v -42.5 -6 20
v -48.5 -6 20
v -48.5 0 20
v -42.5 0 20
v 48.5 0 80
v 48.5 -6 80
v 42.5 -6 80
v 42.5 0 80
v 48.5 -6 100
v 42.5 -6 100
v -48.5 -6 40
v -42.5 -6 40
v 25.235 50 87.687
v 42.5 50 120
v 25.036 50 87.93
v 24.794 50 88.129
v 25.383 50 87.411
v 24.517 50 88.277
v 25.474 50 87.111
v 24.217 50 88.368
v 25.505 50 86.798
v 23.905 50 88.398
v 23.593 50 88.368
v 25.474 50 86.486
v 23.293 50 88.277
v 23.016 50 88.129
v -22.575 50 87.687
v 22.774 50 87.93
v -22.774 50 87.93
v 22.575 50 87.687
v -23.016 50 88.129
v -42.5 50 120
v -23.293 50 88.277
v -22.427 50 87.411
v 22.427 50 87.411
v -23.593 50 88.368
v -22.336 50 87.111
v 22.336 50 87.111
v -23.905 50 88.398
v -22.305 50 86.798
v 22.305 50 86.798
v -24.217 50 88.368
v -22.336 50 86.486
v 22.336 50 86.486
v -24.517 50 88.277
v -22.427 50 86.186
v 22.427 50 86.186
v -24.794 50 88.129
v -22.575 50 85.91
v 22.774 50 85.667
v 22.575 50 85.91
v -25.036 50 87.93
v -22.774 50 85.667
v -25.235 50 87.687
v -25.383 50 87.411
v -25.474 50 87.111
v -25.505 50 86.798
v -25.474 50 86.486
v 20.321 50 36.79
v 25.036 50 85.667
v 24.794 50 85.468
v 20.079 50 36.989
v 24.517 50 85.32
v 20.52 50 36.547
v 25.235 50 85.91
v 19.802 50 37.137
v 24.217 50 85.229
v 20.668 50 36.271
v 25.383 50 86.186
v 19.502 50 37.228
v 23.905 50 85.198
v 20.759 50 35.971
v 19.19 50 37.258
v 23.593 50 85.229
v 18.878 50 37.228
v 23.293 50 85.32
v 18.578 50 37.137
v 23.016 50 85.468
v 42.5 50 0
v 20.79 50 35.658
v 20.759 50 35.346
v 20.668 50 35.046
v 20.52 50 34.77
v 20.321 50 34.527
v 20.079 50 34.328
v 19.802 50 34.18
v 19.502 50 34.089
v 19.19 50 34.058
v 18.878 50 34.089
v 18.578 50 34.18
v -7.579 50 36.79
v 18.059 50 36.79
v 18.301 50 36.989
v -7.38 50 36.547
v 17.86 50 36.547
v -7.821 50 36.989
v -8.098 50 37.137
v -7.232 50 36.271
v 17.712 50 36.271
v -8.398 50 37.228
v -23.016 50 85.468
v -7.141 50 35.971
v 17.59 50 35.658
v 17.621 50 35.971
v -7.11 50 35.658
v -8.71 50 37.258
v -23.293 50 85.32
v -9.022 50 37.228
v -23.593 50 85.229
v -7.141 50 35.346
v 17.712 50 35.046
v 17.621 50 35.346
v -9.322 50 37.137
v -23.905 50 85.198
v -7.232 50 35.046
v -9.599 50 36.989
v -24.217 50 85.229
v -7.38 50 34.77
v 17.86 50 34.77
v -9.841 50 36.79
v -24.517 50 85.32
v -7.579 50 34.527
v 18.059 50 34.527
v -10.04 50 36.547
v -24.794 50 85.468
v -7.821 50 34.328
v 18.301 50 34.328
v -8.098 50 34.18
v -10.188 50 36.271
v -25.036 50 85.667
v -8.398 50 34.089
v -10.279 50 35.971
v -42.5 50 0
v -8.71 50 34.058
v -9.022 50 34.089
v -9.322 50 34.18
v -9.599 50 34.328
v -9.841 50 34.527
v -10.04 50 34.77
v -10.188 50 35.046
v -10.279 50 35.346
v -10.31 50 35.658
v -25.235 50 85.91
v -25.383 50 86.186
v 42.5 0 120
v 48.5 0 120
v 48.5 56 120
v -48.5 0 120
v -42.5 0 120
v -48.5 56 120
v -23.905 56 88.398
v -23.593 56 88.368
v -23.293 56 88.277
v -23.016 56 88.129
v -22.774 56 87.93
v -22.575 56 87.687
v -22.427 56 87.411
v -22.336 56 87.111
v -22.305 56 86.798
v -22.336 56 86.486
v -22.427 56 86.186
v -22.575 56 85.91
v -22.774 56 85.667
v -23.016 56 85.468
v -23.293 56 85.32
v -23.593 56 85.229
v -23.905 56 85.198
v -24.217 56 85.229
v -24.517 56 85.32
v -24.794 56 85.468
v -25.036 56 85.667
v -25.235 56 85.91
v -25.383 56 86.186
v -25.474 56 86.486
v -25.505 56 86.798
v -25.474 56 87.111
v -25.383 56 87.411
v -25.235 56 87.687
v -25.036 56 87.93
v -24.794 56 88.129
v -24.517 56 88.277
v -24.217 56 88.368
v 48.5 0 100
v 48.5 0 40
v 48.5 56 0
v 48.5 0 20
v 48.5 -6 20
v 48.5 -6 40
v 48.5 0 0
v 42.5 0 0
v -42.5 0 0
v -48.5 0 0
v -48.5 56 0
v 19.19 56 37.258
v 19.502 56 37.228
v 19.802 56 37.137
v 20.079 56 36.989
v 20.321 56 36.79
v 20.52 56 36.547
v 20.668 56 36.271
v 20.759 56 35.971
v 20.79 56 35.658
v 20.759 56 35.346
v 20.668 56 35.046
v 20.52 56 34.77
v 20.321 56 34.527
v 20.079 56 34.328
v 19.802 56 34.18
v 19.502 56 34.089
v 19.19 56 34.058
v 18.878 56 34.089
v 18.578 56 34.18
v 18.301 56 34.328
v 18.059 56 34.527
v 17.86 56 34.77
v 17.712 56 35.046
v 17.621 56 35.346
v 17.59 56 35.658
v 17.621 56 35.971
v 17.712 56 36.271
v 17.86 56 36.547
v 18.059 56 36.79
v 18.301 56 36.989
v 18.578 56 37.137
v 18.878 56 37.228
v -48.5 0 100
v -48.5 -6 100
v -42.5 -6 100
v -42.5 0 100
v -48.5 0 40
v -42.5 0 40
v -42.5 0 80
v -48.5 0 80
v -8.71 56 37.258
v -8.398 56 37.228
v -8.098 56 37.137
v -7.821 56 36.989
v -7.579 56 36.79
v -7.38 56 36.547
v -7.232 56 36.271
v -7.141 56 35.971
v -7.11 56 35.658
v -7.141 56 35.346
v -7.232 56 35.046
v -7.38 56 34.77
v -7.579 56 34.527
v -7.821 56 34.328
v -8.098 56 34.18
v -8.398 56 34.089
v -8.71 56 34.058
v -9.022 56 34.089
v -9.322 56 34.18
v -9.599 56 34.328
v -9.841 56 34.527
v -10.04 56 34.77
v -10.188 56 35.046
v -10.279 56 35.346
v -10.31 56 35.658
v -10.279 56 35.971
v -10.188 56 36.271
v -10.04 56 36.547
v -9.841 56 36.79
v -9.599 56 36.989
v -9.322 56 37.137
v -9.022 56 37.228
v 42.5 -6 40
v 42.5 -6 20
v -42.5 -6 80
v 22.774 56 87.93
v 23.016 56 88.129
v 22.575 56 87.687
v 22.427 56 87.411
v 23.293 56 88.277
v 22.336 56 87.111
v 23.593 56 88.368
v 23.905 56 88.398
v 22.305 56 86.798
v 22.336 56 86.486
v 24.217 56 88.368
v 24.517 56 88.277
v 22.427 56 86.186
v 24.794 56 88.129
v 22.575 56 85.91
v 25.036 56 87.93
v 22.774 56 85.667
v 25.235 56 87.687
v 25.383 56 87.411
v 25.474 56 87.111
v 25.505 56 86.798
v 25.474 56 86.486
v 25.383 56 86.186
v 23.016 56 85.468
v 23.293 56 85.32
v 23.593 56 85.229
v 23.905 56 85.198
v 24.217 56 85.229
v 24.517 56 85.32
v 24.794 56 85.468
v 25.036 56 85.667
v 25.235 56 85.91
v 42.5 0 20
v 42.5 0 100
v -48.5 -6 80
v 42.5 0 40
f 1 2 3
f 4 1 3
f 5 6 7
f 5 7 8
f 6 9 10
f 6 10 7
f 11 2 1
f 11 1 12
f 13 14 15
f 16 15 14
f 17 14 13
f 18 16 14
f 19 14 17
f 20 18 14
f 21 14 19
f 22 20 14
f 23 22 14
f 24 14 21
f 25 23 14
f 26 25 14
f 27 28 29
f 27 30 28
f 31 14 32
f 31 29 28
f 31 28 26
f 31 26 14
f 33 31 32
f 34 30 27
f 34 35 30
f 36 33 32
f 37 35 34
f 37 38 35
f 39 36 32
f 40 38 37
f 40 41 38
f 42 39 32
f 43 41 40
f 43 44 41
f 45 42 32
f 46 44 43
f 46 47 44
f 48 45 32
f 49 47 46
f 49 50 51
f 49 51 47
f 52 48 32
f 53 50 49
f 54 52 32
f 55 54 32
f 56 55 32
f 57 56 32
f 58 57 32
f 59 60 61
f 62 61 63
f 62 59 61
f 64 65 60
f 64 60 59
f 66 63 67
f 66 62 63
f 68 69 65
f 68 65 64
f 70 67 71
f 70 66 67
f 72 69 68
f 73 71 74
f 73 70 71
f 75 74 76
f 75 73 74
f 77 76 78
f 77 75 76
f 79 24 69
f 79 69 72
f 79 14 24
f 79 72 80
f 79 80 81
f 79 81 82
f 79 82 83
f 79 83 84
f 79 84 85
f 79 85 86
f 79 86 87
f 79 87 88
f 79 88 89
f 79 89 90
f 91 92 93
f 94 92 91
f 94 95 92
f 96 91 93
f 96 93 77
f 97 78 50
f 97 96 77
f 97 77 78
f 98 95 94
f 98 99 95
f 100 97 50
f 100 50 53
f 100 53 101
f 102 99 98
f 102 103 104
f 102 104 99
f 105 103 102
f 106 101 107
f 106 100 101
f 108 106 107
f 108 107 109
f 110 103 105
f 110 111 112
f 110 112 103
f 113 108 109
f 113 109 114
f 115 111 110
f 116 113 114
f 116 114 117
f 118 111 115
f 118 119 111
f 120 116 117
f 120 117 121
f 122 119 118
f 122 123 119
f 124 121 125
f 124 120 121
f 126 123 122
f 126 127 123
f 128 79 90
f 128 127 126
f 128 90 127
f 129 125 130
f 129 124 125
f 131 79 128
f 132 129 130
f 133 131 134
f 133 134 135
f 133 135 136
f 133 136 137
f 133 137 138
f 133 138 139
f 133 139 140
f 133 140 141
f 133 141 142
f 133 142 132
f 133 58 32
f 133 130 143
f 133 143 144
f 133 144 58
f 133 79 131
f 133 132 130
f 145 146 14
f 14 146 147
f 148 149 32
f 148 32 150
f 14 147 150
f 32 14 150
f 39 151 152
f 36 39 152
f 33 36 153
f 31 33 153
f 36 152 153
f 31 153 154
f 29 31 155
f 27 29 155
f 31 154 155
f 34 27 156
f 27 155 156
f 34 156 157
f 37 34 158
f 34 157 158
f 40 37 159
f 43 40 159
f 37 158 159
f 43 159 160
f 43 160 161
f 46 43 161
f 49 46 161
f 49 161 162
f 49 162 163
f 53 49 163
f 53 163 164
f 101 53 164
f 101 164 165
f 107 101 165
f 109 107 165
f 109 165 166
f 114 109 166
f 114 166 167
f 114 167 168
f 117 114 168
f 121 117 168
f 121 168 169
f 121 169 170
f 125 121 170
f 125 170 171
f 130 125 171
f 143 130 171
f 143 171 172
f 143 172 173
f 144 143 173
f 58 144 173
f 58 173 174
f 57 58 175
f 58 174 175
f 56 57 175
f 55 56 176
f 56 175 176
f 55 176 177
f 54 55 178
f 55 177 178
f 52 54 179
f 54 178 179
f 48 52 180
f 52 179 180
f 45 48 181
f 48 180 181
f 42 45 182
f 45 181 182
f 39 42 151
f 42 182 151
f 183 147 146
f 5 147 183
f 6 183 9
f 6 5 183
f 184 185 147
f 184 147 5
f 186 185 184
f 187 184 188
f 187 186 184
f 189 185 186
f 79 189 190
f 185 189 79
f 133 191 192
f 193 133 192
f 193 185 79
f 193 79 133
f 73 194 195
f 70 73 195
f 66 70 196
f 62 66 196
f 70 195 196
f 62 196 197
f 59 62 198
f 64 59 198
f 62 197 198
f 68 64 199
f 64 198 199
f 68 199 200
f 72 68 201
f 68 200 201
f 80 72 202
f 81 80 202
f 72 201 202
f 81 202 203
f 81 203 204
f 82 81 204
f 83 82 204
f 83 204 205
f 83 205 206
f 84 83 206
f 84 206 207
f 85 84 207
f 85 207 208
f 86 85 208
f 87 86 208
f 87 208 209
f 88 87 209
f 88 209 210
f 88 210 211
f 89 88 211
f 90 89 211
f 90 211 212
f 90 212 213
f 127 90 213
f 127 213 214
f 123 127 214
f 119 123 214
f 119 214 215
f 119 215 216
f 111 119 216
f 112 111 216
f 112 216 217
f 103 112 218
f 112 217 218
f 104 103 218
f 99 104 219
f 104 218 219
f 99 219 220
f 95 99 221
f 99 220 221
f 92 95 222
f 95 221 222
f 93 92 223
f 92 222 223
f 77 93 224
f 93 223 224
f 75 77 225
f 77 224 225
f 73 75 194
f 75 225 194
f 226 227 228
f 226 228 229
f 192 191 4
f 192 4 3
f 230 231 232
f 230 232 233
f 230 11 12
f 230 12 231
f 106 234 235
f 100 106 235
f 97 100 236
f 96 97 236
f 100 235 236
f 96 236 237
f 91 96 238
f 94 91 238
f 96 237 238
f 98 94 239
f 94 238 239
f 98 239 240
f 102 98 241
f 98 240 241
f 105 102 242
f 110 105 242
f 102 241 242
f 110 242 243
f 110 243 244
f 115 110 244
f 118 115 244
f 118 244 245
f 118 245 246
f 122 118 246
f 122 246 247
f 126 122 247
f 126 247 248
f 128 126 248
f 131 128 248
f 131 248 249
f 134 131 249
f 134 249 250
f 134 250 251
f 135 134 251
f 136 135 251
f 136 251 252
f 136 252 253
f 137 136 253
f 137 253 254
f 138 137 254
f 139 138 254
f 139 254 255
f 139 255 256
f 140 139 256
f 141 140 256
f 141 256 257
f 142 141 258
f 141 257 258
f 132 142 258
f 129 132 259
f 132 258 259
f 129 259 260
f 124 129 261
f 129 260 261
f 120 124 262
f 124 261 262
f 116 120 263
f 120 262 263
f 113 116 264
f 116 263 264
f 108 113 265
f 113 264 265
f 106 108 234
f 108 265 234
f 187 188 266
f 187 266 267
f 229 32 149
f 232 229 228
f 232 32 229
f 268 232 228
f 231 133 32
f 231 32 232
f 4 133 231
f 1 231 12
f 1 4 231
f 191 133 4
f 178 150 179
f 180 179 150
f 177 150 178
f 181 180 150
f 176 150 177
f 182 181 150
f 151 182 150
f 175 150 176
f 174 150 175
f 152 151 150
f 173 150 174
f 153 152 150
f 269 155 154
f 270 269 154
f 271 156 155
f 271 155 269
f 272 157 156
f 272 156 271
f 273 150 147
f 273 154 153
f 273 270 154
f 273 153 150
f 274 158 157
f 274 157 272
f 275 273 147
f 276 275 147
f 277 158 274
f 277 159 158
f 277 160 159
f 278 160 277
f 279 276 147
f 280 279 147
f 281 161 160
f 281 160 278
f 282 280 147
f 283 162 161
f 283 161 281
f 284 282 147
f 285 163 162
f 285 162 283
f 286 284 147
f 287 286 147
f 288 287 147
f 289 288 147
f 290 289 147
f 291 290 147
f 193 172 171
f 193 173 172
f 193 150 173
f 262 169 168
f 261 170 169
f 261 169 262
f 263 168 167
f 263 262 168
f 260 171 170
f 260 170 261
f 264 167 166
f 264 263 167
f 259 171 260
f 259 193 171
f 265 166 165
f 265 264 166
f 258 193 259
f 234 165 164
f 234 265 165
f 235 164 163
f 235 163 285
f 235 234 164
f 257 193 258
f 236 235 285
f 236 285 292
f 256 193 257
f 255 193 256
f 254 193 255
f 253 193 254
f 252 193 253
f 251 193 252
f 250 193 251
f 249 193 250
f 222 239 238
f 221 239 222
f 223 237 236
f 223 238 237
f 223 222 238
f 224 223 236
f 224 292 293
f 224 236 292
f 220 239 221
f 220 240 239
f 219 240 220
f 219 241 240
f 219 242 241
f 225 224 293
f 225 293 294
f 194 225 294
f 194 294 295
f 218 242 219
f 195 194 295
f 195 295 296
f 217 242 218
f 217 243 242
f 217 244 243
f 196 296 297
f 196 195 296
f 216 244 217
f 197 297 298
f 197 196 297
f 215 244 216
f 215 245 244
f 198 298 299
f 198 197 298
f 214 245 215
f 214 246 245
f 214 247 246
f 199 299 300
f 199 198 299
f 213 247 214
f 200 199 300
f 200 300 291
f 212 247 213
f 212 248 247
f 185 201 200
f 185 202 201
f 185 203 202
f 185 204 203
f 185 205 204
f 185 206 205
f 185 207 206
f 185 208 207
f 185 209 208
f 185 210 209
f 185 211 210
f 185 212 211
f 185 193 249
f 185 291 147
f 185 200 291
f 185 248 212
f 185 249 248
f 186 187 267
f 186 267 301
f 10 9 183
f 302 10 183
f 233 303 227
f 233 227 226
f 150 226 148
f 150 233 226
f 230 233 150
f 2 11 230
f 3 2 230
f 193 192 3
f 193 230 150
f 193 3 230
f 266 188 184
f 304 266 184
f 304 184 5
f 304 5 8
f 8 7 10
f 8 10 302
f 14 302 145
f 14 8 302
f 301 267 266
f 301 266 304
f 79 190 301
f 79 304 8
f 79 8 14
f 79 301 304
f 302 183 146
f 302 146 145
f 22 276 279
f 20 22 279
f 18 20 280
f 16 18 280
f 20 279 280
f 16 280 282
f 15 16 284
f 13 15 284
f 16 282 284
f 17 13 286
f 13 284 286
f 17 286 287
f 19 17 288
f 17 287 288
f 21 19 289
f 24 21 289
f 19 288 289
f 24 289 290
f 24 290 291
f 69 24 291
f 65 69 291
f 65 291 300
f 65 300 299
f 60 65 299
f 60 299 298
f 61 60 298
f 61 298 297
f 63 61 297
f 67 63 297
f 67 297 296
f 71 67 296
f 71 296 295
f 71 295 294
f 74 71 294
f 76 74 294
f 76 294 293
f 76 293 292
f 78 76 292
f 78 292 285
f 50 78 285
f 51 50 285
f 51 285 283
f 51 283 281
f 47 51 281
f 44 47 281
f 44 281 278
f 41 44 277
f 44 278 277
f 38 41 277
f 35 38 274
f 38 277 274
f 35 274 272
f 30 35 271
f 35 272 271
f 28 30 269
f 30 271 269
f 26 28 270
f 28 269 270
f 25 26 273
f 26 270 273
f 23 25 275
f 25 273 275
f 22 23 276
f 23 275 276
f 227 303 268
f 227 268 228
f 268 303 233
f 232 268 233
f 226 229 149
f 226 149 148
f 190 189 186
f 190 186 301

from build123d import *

# Parameters (mm, degrees)
BOSS_EXTRUDE1_DEPTH = 120
SKETCH2_W           = 20
SKETCH2_H           = 6
BOSS_EXTRUDE2_DEPTH = 6
SKETCH3_W           = 20
SKETCH3_H           = 6
BOSS_EXTRUDE3_DEPTH = 6
SKETCH4_R           = 1.6
CUT_EXTRUDE1_DEPTH  = 10


with BuildPart() as part:
    # Sketch1 → Boss-Extrude1 (new body)
    with BuildSketch(Plane.XY):
        Polygon((42.5, 0), (42.5, 50), (-42.5, 50), (-42.5, 0), (-48.5, 0), (-48.5, 56), (48.5, 56), (48.5, 0), align=None)
    extrude(amount=BOSS_EXTRUDE1_DEPTH)

    # Sketch2 → Boss-Extrude2 (add)
    with BuildSketch(Plane(origin=(48.5, 0, 0), x_dir=(0, 0, -1), z_dir=(1, 0, 0))):
        with Locations((-90, -3)):
            Rectangle(SKETCH2_W, SKETCH2_H)
        with Locations((-30, -3)):
            Rectangle(SKETCH2_W, SKETCH2_H)
    extrude(amount=-BOSS_EXTRUDE2_DEPTH)

    # Sketch3 → Boss-Extrude3 (add)
    with BuildSketch(Plane.ZY.offset(48.5)):
        with Locations((30, -3)):
            Rectangle(SKETCH3_W, SKETCH3_H)
        with Locations((90, -3)):
            Rectangle(SKETCH3_W, SKETCH3_H)
    extrude(amount=-BOSS_EXTRUDE3_DEPTH)

    # Sketch4 → Cut-Extrude1 (cut)
    with BuildSketch(Plane(origin=(0, 56, 0), x_dir=(1, 0, 0), z_dir=(0, 1, 0))):
        with Locations(Location((-23.905, -86.79842215, 0), (0, 0, 270))):
            Circle(SKETCH4_R)
        with Locations(Location((23.905, -86.79842215, 0), (0, 0, 270))):
            Circle(SKETCH4_R)
        with Locations(Location((-8.71, -35.65842215, 0), (0, 0, 270))):
            Circle(SKETCH4_R)
        with Locations(Location((19.19, -35.65842215, 0), (0, 0, 270))):
            Circle(SKETCH4_R)
    extrude(amount=-CUT_EXTRUDE1_DEPTH, mode=Mode.SUBTRACT)


solid = part.part
